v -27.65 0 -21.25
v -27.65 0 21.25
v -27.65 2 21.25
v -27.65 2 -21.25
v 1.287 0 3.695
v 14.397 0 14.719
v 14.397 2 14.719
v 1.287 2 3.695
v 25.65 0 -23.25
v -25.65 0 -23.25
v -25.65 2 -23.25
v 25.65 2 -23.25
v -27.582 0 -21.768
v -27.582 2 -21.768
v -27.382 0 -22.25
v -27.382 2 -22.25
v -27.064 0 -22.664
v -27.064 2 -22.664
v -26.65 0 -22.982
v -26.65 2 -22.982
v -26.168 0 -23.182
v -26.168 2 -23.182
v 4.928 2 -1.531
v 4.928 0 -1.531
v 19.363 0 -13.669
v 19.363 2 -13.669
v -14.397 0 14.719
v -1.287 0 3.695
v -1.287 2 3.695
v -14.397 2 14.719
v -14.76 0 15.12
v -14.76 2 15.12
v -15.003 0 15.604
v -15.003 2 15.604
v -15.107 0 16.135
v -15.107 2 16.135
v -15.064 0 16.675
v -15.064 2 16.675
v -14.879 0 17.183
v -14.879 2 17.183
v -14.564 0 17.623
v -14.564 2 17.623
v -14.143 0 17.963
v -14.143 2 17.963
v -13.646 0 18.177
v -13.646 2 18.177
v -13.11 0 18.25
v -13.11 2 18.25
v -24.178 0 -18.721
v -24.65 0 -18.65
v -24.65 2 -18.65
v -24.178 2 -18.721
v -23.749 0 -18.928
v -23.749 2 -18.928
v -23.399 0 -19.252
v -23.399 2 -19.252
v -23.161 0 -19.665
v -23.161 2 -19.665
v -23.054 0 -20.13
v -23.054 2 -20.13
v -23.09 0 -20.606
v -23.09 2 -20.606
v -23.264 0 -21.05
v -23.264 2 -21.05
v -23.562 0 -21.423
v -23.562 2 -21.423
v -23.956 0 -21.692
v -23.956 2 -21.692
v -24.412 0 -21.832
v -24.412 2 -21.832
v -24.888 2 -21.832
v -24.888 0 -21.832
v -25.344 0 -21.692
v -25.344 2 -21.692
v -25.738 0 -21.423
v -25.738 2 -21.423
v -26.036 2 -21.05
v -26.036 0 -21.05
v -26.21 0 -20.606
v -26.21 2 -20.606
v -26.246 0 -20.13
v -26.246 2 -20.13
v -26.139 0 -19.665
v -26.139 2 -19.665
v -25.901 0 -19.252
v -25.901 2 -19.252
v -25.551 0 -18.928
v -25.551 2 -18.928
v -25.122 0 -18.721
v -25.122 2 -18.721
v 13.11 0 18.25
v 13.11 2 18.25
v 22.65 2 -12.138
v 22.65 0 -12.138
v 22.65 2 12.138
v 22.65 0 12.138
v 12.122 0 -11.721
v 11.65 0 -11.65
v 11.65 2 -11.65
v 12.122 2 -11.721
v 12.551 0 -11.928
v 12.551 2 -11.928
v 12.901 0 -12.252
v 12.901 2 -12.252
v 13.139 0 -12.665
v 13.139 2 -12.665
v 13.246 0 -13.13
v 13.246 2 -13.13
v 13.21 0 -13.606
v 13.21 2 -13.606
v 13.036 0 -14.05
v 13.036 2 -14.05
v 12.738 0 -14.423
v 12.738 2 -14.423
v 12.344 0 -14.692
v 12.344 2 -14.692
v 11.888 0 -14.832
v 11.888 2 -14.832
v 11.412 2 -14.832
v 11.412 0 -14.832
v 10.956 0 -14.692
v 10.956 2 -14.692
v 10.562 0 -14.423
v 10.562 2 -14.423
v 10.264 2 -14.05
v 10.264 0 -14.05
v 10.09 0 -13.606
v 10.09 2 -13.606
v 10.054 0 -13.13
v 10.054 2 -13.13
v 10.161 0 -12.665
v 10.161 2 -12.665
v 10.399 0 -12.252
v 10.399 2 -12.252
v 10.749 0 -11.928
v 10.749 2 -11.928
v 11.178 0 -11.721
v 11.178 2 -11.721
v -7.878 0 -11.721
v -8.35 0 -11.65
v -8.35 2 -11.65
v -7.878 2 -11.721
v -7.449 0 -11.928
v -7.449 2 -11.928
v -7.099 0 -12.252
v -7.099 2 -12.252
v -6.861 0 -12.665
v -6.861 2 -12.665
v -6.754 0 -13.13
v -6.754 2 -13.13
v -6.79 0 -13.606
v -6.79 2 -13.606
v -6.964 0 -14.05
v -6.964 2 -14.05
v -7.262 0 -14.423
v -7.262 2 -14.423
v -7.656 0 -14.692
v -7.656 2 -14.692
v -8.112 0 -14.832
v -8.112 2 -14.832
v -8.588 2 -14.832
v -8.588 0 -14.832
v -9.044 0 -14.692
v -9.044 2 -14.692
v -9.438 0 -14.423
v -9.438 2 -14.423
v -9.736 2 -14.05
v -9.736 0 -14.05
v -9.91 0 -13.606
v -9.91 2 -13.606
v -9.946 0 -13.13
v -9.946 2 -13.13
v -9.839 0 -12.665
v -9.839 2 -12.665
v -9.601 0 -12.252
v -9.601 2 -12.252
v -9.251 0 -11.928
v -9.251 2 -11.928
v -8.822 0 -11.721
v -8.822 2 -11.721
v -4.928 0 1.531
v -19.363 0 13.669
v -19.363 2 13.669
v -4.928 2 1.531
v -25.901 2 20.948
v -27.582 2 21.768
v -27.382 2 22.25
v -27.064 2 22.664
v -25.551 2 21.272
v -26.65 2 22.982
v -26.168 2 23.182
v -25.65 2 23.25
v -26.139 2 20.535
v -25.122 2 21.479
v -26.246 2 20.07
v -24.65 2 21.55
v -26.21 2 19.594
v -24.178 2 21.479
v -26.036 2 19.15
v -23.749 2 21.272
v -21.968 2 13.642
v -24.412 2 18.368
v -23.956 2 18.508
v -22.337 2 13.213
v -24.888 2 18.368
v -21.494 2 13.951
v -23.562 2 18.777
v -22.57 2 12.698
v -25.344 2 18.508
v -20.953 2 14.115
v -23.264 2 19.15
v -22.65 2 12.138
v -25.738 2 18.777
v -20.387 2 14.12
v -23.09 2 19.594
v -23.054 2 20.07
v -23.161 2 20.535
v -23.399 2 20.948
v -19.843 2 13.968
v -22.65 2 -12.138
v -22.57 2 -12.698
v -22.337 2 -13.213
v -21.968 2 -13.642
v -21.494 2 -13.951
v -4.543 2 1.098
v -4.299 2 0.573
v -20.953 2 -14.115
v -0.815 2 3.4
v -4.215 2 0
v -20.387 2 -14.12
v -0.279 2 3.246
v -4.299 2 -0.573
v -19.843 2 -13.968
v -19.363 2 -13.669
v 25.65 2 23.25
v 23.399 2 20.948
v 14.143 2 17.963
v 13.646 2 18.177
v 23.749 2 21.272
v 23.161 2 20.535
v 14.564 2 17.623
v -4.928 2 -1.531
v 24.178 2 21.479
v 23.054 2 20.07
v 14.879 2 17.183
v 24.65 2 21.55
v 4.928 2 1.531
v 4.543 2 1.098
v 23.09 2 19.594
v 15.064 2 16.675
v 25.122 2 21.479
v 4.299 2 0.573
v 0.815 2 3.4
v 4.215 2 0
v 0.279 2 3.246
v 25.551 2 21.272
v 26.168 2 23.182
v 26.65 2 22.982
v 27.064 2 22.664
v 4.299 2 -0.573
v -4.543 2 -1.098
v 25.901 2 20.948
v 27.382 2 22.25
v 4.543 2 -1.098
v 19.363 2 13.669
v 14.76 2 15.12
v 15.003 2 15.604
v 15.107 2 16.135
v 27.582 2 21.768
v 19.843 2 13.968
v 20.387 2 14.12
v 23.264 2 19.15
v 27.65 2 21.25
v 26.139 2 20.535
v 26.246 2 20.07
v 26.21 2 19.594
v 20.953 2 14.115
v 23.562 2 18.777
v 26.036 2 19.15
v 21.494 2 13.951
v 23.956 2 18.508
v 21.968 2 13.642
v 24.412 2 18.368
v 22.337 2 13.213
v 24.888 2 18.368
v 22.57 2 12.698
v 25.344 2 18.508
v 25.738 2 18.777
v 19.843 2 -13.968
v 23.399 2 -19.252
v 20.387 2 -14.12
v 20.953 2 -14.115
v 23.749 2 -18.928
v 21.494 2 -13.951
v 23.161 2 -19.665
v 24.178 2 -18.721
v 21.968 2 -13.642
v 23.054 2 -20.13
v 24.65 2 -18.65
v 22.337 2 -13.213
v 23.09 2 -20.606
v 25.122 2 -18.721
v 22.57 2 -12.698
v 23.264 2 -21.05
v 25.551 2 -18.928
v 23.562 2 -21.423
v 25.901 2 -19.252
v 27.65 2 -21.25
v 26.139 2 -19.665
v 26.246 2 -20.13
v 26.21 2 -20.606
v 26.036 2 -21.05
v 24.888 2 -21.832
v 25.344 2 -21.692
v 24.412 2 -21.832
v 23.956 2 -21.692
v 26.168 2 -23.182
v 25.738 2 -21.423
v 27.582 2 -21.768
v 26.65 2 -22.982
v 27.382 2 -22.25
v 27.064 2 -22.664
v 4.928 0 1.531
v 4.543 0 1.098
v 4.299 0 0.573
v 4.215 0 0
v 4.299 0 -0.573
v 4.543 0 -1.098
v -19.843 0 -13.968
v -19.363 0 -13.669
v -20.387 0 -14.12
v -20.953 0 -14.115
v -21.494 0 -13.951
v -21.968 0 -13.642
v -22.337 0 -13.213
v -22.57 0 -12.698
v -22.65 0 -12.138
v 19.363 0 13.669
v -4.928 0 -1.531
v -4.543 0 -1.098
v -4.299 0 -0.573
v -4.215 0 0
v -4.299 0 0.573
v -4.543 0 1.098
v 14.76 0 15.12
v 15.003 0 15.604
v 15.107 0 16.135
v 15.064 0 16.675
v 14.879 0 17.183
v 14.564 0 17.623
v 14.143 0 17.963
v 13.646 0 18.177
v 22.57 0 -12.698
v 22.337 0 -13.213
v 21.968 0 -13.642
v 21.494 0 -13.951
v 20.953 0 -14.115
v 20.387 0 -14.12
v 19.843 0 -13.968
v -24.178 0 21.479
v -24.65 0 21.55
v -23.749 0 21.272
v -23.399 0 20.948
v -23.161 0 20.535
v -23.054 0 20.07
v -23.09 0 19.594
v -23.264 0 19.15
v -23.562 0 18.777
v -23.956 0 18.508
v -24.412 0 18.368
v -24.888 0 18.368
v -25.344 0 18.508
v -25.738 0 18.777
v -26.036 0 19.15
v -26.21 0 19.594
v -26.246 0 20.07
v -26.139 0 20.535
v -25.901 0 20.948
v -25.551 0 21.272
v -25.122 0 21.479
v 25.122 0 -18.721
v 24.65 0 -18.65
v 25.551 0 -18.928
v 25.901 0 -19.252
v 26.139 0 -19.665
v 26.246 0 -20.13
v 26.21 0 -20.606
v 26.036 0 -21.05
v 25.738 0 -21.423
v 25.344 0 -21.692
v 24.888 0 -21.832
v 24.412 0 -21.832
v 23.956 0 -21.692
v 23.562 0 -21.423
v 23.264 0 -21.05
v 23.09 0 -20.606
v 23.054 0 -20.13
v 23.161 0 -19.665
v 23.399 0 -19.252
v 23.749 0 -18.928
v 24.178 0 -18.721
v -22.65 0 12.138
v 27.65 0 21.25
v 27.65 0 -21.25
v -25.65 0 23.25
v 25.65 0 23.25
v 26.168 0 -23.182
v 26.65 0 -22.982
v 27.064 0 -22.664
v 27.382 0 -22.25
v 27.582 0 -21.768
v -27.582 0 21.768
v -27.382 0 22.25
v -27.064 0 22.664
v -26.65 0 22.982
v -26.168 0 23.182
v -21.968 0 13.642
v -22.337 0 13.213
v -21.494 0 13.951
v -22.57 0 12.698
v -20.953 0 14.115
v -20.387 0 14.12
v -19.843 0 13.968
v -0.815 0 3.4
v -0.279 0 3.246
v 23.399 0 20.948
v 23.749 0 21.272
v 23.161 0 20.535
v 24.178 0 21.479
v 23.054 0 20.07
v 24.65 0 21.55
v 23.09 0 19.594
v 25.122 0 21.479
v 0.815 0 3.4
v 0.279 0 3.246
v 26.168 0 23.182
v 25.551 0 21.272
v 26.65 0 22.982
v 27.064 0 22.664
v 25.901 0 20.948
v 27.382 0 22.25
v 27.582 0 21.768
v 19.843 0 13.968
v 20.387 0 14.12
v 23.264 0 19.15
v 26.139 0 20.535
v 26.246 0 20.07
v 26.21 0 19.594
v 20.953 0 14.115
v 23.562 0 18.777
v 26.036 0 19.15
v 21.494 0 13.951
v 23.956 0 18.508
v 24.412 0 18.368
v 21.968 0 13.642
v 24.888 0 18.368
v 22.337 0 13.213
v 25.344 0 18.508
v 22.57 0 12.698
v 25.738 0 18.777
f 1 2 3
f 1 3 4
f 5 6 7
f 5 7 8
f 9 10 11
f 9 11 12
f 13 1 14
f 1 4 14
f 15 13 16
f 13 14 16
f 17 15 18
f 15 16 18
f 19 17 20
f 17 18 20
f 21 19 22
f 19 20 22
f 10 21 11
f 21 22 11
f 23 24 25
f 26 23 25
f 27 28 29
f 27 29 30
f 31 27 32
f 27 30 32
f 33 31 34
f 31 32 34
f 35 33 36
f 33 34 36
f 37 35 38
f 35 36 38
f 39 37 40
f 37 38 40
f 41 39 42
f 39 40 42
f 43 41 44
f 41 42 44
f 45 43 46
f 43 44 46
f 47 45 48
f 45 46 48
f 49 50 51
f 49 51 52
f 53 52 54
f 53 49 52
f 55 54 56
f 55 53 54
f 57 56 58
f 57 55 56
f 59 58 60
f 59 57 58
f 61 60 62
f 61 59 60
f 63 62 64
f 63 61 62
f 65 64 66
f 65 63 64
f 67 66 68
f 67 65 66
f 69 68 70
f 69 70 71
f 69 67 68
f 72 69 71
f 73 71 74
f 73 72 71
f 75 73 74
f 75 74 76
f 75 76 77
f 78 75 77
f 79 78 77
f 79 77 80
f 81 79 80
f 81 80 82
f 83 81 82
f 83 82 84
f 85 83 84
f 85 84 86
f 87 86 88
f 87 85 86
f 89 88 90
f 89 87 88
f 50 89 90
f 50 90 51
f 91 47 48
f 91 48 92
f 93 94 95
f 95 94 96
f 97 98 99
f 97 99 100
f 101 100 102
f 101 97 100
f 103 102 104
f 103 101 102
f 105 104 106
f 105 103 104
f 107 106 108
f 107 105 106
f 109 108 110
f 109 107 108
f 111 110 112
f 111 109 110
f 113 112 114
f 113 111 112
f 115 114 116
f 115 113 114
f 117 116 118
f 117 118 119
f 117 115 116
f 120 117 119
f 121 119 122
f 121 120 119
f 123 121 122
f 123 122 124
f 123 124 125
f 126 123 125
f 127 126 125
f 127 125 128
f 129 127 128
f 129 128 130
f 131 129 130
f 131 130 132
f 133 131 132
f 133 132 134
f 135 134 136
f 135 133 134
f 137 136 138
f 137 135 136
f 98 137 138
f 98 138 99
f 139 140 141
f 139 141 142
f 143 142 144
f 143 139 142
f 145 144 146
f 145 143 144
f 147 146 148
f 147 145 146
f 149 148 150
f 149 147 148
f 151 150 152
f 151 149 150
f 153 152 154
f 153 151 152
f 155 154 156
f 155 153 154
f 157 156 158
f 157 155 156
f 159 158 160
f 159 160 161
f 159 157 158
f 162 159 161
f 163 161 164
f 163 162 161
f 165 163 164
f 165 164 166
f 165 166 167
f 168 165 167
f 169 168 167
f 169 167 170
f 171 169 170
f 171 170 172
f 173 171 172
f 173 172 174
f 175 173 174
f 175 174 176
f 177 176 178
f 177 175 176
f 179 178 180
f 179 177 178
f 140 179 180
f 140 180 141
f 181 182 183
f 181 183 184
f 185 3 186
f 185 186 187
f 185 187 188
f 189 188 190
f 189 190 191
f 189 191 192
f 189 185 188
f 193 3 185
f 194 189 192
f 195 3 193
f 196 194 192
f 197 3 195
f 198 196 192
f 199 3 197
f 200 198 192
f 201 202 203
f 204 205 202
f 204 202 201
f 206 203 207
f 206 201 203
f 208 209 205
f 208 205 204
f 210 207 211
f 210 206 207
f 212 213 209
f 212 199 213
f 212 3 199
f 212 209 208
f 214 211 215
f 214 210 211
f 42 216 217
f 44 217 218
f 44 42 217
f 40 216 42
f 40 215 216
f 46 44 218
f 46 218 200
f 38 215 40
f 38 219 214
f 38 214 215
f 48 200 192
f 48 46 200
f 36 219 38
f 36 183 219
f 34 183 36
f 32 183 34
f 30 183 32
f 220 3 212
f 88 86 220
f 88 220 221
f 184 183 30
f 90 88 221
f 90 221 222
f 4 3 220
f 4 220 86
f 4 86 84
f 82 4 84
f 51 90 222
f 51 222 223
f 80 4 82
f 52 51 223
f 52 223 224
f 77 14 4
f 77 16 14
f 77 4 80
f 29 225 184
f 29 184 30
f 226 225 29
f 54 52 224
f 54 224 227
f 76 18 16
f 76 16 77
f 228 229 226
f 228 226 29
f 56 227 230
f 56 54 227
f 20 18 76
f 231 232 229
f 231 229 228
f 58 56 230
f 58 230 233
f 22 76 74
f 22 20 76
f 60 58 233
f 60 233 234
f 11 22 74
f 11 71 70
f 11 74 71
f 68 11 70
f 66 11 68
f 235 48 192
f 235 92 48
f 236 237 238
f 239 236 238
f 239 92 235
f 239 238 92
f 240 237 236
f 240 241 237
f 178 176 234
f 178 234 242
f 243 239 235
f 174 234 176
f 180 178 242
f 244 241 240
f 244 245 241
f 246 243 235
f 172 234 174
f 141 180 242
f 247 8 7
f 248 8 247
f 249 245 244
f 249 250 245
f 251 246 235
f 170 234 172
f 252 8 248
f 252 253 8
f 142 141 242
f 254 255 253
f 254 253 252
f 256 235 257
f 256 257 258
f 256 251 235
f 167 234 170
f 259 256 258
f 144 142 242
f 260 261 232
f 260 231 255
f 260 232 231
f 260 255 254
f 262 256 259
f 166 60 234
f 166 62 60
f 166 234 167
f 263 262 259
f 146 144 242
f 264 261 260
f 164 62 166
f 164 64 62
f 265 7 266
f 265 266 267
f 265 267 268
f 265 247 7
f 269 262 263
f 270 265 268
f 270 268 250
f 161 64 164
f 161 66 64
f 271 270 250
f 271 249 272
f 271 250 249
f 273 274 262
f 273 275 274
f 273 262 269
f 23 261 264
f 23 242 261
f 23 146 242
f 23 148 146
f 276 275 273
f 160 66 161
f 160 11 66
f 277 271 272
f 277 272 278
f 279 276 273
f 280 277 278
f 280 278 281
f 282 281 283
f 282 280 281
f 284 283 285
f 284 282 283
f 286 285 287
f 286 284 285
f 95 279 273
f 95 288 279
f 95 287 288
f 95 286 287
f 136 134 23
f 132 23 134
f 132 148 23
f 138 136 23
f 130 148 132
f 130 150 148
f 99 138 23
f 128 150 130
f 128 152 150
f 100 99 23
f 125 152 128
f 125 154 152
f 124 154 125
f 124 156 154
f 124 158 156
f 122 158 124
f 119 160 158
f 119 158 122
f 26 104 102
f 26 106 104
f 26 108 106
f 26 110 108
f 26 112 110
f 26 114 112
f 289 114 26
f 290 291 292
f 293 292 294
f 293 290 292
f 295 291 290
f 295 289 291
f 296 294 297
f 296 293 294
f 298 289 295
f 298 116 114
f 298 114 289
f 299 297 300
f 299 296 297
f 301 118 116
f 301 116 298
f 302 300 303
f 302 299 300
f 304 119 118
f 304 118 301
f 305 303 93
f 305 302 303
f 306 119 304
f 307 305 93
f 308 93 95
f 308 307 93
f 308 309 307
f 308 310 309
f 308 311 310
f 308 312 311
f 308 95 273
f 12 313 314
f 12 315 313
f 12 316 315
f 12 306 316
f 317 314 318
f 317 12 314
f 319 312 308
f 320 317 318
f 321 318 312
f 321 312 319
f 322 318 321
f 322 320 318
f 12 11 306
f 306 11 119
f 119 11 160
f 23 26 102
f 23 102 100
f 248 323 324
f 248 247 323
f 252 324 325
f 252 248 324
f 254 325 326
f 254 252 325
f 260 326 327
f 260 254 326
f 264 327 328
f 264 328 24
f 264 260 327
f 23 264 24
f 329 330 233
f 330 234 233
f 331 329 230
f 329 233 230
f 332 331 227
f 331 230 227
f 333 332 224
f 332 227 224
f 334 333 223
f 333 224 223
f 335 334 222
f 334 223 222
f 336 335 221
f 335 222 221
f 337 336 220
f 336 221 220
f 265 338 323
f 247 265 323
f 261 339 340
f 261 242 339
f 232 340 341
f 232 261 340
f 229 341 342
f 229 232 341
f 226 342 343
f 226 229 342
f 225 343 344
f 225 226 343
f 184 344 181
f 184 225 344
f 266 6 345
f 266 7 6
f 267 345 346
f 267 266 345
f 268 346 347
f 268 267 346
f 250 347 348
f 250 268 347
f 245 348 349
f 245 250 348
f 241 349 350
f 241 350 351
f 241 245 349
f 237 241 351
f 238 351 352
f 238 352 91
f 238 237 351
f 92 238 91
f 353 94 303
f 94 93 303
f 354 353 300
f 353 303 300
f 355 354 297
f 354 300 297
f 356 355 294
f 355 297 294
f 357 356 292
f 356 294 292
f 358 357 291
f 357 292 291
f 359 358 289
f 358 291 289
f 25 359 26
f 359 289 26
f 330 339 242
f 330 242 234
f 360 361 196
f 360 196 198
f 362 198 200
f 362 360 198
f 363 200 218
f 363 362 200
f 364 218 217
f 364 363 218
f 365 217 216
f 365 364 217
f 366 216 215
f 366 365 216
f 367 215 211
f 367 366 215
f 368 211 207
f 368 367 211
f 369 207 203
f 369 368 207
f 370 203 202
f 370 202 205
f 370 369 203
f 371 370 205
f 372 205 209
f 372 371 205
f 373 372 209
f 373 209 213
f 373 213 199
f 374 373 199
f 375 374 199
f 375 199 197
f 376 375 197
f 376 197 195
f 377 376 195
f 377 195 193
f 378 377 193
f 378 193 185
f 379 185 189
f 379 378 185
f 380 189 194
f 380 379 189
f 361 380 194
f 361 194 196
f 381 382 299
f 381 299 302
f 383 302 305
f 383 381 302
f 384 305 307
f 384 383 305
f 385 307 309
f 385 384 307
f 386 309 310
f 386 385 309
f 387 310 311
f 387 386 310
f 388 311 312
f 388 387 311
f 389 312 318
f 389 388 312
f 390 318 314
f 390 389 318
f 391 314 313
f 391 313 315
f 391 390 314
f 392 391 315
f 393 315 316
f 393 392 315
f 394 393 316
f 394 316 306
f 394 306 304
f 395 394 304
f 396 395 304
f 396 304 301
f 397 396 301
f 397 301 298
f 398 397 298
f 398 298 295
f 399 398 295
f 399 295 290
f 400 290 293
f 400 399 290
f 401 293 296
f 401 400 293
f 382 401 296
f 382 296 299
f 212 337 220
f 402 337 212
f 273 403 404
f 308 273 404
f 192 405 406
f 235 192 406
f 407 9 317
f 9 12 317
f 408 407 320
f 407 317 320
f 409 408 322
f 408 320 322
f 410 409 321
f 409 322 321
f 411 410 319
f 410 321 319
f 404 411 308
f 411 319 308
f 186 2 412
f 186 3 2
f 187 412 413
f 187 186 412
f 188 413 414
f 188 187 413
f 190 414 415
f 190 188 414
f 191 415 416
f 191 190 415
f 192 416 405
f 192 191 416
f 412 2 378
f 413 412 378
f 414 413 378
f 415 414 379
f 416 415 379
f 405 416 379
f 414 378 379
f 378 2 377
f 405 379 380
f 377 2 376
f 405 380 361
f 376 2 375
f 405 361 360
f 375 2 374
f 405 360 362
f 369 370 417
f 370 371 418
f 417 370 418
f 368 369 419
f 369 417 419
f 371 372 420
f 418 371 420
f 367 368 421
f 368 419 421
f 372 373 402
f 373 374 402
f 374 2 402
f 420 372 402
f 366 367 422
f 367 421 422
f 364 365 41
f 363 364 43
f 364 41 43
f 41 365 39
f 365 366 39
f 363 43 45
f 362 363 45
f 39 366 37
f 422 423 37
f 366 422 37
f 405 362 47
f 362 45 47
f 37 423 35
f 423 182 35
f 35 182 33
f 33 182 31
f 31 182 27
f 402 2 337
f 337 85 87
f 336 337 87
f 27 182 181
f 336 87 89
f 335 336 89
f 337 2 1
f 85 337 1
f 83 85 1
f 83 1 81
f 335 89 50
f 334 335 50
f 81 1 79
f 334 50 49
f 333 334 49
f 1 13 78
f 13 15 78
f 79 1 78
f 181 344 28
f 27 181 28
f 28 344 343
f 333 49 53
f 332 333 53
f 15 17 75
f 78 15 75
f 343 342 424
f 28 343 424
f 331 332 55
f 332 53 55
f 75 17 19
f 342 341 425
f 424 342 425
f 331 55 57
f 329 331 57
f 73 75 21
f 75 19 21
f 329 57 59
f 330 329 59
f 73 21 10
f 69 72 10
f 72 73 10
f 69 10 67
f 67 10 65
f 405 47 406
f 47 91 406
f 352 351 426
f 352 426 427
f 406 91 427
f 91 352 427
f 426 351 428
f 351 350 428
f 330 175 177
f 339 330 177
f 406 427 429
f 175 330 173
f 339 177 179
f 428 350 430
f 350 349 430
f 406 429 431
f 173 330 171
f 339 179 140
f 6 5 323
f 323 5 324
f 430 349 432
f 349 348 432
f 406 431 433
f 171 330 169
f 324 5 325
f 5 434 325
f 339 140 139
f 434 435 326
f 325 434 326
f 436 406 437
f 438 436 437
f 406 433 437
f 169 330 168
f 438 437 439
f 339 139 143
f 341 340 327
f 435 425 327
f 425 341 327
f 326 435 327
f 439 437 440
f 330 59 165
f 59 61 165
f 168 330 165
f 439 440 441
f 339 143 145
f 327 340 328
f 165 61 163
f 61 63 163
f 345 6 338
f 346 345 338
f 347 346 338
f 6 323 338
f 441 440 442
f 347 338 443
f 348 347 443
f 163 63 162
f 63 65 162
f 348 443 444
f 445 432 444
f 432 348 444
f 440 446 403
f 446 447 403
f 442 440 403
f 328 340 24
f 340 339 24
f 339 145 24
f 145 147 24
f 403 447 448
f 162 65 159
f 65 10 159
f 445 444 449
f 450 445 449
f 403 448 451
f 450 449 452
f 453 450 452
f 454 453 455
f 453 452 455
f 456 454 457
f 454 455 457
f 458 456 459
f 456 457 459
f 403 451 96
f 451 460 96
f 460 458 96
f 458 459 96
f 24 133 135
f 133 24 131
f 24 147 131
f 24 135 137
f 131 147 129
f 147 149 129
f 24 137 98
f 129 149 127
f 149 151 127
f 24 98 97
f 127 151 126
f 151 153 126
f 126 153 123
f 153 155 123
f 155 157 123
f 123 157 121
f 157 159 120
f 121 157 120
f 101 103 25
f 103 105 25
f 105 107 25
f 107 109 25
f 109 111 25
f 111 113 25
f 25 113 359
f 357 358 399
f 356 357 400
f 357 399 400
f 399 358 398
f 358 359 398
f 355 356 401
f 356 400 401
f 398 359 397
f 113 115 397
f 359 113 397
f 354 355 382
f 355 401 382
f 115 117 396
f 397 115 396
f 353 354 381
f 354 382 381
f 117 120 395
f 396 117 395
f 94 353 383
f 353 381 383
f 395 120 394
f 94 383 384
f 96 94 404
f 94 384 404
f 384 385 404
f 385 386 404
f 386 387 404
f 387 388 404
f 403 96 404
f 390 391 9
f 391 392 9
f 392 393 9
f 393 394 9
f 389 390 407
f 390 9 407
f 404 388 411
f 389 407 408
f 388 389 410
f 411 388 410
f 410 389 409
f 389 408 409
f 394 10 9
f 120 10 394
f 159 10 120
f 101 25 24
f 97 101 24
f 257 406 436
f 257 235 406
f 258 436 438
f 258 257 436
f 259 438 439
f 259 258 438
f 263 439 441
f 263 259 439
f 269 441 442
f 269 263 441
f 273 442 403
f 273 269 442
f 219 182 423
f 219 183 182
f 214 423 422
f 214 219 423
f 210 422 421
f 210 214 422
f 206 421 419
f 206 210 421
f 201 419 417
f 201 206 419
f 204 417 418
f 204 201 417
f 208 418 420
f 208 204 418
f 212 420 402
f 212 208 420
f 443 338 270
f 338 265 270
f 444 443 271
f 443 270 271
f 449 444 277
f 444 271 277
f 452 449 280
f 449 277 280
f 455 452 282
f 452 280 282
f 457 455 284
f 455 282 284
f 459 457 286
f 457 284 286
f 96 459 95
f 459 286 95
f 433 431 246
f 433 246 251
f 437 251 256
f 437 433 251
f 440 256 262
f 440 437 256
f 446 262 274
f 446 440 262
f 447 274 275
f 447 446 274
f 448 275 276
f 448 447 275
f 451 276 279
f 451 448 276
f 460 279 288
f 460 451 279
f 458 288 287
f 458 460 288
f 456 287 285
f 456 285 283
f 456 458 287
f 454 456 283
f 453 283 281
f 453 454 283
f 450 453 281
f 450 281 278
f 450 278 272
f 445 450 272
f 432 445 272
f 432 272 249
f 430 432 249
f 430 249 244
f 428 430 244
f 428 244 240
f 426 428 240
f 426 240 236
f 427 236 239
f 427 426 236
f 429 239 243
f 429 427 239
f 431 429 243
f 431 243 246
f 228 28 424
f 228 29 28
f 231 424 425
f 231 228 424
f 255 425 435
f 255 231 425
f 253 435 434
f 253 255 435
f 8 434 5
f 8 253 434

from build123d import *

# Parameters (mm, degrees)
SKETCH_1_W      = 55.3
SKETCH_1_H      = 46.5
SKETCH_1_R      = 1.6
EXTRUDE_1_DEPTH = 2
FILLET_1_R      = 2


with BuildPart() as part:
    # 草图1 → 凸台-拉伸1 (new body)
    with BuildSketch(Plane(origin=(0, 0, 0), x_dir=(1, 0, 0), z_dir=(0, 1, 0))):
        Rectangle(SKETCH_1_W, SKETCH_1_H)
        with Locations(Location((11.65, 13.25, 0), (0, 0, 270))):
            Circle(SKETCH_1_R, mode=Mode.SUBTRACT)
        with Locations(Location((-8.35, 13.25, 0), (0, 0, 270))):
            Circle(SKETCH_1_R, mode=Mode.SUBTRACT)
        with Locations(Location((24.65, 20.25, 0), (0, 0, 270))):
            Circle(SKETCH_1_R, mode=Mode.SUBTRACT)
        with Locations(Location((-24.65, 20.25, 0), (0, 0, 270))):
            Circle(SKETCH_1_R, mode=Mode.SUBTRACT)
        with Locations(Location((-24.65, -19.95, 0), (0, 0, 270))):
            Circle(SKETCH_1_R, mode=Mode.SUBTRACT)
        with Locations(Location((24.65, -19.95, 0), (0, 0, 270))):
            Circle(SKETCH_1_R, mode=Mode.SUBTRACT)
        Polygon((-3.107609479, 0), (-22.65, 16.432570691), (-22.65, -16.432570691), align=None, mode=Mode.SUBTRACT)
        Polygon((0, -2.613089345), (-18.596153962, -18.25), (18.596153962, -18.25), align=None, mode=Mode.SUBTRACT)
        Polygon((3.107609479, 0), (22.65, 16.432570691), (22.65, -16.432570691), align=None, mode=Mode.SUBTRACT)
    extrude(amount=EXTRUDE_1_DEPTH)

    # 圆角1
    fillet_1_edges = [part.edges().sort_by_distance(p)[0] for p in [
        (-22.65, 1, 16.432570691),
        (-3.107609479, 1, 0),
        (-22.65, 1, -16.432570691),
        (18.596153962, 1, 18.25),
        (0, 1, 2.613089345),
        (-18.596153962, 1, 18.25),
        (3.107609479, 1, 0),
        (22.65, 1, 16.432570691),
        (22.65, 1, -16.432570691),
        (27.65, 1, 23.25),
        (-27.65, 1, 23.25),
        (-27.65, 1, -23.25),
        (27.65, 1, -23.25),
    ]]
    fillet(fillet_1_edges, radius=FILLET_1_R)


solid = part.part
